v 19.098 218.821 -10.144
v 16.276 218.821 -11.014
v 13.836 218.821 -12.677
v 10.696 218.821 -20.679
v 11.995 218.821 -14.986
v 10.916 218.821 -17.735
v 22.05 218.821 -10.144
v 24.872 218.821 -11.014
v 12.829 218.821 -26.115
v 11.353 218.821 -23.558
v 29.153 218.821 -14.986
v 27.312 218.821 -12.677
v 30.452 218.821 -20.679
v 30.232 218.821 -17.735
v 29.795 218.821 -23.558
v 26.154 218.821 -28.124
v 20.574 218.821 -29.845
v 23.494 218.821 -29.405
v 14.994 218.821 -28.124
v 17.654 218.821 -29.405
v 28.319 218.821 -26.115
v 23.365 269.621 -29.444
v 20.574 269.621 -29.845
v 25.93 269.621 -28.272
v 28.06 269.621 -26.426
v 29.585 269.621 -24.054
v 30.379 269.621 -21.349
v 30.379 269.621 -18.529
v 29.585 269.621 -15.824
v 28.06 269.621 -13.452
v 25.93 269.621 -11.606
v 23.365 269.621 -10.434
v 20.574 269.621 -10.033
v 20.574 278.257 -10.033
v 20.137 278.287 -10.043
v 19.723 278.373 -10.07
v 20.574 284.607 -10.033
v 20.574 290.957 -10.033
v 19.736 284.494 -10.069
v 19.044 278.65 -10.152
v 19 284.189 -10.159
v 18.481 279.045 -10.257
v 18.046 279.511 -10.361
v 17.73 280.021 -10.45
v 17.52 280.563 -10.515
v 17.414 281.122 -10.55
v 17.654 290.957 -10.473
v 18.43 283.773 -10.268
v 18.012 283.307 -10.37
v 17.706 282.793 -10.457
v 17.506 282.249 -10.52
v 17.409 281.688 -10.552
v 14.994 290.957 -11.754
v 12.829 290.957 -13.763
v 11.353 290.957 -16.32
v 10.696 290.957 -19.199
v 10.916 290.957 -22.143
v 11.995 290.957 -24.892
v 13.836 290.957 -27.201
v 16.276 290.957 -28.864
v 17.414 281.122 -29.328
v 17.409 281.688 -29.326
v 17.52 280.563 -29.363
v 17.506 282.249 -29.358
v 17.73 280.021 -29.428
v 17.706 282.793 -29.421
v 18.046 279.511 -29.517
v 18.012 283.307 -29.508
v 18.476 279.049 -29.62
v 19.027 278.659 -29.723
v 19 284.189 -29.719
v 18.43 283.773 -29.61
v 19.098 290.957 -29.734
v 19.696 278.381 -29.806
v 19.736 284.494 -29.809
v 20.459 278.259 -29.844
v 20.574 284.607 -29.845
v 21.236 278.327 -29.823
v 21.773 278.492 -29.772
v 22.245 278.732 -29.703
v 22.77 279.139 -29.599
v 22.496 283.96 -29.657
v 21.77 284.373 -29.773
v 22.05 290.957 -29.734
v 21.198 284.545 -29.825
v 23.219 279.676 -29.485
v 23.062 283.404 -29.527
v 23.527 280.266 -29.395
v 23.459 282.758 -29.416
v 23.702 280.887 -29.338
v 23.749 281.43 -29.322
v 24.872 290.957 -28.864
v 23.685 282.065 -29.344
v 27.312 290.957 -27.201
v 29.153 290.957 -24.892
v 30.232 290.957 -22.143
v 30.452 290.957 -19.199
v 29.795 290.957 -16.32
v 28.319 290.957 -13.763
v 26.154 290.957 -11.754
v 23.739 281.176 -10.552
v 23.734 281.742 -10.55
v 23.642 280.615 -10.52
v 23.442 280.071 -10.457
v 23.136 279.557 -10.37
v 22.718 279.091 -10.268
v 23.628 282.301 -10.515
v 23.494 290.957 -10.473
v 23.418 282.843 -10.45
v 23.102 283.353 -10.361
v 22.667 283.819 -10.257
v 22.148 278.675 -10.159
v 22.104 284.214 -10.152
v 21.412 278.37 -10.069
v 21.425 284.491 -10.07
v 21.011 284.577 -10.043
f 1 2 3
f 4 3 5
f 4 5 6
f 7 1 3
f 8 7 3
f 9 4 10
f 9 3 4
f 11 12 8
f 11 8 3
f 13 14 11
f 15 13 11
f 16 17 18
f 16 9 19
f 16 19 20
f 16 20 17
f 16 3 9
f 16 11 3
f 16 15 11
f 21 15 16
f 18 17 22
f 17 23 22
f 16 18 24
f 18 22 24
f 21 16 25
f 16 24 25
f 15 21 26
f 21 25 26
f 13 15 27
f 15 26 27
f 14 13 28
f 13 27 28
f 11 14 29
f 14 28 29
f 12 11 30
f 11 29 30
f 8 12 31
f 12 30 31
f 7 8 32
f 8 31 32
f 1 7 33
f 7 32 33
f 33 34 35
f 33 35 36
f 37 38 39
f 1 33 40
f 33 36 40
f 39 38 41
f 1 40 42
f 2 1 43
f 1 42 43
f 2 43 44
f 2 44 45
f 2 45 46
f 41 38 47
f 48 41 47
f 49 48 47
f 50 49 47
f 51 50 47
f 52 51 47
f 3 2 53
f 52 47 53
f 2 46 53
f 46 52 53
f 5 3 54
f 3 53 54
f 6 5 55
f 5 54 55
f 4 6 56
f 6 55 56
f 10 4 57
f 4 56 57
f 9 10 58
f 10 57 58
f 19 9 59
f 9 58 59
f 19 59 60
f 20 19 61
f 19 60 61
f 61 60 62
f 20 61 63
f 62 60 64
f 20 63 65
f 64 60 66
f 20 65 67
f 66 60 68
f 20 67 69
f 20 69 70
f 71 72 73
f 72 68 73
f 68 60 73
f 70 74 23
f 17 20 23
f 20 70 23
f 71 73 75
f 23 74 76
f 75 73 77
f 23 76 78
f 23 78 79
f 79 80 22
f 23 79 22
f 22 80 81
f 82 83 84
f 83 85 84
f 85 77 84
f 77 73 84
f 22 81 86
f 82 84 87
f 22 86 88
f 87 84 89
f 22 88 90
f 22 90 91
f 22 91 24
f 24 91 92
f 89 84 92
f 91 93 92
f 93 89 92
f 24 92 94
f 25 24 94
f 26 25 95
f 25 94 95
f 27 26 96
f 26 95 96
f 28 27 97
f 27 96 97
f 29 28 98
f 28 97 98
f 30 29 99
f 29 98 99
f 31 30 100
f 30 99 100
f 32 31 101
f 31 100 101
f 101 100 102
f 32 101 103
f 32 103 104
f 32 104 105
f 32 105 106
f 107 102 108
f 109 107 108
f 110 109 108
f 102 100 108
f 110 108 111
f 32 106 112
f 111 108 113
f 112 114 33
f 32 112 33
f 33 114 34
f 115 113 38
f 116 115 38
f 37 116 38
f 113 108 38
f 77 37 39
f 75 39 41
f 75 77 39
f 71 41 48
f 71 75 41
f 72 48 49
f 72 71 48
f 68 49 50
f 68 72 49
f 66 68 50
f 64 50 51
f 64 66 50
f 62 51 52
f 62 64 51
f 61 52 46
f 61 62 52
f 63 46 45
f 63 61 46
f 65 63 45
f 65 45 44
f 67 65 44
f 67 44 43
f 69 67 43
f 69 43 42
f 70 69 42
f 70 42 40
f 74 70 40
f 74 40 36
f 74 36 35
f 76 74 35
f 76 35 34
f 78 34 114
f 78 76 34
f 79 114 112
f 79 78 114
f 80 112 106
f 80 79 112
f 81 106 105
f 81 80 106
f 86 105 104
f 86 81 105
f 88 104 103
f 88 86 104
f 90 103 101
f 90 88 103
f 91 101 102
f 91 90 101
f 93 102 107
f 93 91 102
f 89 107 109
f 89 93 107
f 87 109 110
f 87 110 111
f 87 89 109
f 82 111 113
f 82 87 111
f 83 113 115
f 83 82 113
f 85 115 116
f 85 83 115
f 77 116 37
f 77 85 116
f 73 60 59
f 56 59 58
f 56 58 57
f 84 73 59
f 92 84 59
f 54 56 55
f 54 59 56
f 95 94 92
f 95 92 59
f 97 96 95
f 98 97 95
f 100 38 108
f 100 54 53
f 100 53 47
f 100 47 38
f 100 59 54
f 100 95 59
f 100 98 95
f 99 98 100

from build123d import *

# Parameters (mm, degrees)
BOSS_EXTRUDE1_DEPTH      = 6.35
SKETCH6_R                = 19.431
BOSS_EXTRUDE4_DEPTH      = 0.762
SKETCH7_R                = 19.05
BOSS_EXTRUDE5_DEPTH      = 68.326
FILLET6_R                = 5.08
FILLET7_R                = 1.905
BOSS_EXTRUDE15_DEPTH     = 6.35
SKETCH24_R               = 4.064
BOSS_EXTRUDE16_DEPTH     = 10.16
SKETCH25_R               = 2.54
BOSS_EXTRUDE17_DEPTH     = 10.16
BOSS_EXTRUDE19_DEPTH     = 16.51
FILLET13_R               = 1.905
FILLET14_R               = 5.08
BOSS_EXTRUDE20_DEPTH     = 18.796
CHAMFER1_SIZE            = 2.54
FILLET15_R               = 2.54
CHAMFER2_SIZE            = 0.762
SKETCH27_R               = 3.175
CUT_EXTRUDE3_DEPTH       = 19.05
SKETCH28_R               = 19.05
BOSS_EXTRUDE22_DEPTH     = 1.27
SKETCH29_R               = 19.05
BOSS_EXTRUDE24_DEPTH     = 3.048
BOSS_EXTRUDE25_START     = 4.318
SKETCH8_R                = 4.953
BOSS_EXTRUDE25_DEPTH     = 1.27
FILLET16_R               = 0.2286
BOSS_EXTRUDE26_DEPTH     = 254.381
BOSS_EXTRUDE27_DEPTH     = 8.89
SKETCH33_R               = 9.906
BOSS_EXTRUDE28_DEPTH     = 21.336
BOSS_EXTRUDE30_DEPTH     = 2.159
BOSS_EXTRUDE31_DEPTH     = 2.159
BOSS_EXTRUDE33_DEPTH     = 12.7
BOSS_EXTRUDE33_2_DEPTH   = 12.7
FILLET17_R               = 0.2286
FILLET18_R               = 0.2286
SKETCH43_R               = 3.175
BOSS_EXTRUDE34_DEPTH     = 1.27
FILLET19_R               = 1.27
SKETCH44_R               = 3.175
BOSS_EXTRUDE35_DEPTH     = 1.27
FILLET20_R               = 1.27
CUT_EXTRUDE5_START       = -2.54
CUT_EXTRUDE5_DEPTH       = 2.54
CUT_EXTRUDE6_START       = -2.54
CUT_EXTRUDE6_DEPTH       = 2.54
SKETCH47_R               = 2.54
BOSS_EXTRUDE36_DEPTH     = 2.54
BOSS_EXTRUDE36_2_DEPTH   = 2.54
BOSS_EXTRUDE36_3_DEPTH   = 2.54
FILLET22_R               = 1.524
FILLET23_R               = 1.524
SKETCH48_R               = 3.81
BOSS_EXTRUDE37_DEPTH     = 1.524
FILLET24_R               = 1.524
FILLET25_R               = 1.524
SKETCH49_R               = 3.81
CUT_EXTRUDE7_DEPTH       = 2.54
SKETCH50_R               = 3.556
BOSS_EXTRUDE39_DEPTH     = 2.54
CUT_EXTRUDE11_DEPTH      = 305.554552522
CUT_EXTRUDE11_DEPTH_BACK = 305.554552522
SKETCH52_R               = 3.175
SKETCH55_W               = 170.584012947
SKETCH55_H               = 114.953192418
CUT_EXTRUDE13_DEPTH      = 346.202
SKETCH56_R               = 9.906
BOSS_EXTRUDE40_DEPTH     = 50.8


with BuildPart() as part:
    # Sketch1 → Boss-Extrude1 (new body)
    with BuildSketch(Plane(origin=(0, 0, 0), x_dir=(1, 0, 0), z_dir=(0, 1, 0))):
        with BuildLine():
            Line((0, 32.639), (7.239, 39.878))
            Line((7.239, 39.878), (55.118, 39.878))
            ThreePointArc((55.118, 39.878), (75.057, 19.939), (55.118, 0))
            Line((55.118, 0), (7.239, 0))
            Line((7.239, 0), (0, 7.239))
            Line((0, 7.239), (0, 32.639))
        make_face()
    extrude(amount=BOSS_EXTRUDE1_DEPTH)

    # Fillet6
    fillet6_edges = [part.edges().sort_by_distance(p)[0] for p in [
        (0, 3.175, -7.239),
        (0, 3.175, -32.639),
    ]]
    fillet(fillet6_edges, radius=FILLET6_R)

    # Fillet7
    fillet7_edges = [part.edges().sort_by_distance(p)[0] for p in [
        (7.239, 3.175, 0),
        (7.239, 3.175, -39.878),
    ]]
    fillet(fillet7_edges, radius=FILLET7_R)


with BuildPart() as body_2:
    # Sketch6 → Boss-Extrude4 (new body)
    with BuildSketch(Plane(origin=(0, 6.35, 0), x_dir=(1, 0, 0), z_dir=(0, 1, 0))):
        with Locations(Location((55.118, 19.939, 0), (0, 0, 90))):
            Circle(SKETCH6_R)
    extrude(amount=BOSS_EXTRUDE4_DEPTH)


with BuildPart() as body_3:
    # Sketch7 → Boss-Extrude5 (new body)
    with BuildSketch(Plane(origin=(0, 7.112, 0), x_dir=(1, 0, 0), z_dir=(0, 1, 0))):
        with Locations(Location((55.118, 19.939, 0), (0, 0, 270))):
            Circle(SKETCH7_R)
    extrude(amount=BOSS_EXTRUDE5_DEPTH)


with BuildPart() as body_4:
    # Sketch23 → Boss-Extrude15 (new body)
    with BuildSketch(Plane(origin=(12.522748088, 0, -46.735532116), x_dir=(0, -1, 0), z_dir=(0.25881904510252135, 0, -0.9659258262890681))):
        with BuildLine():
            Line((-2.032, -53.883866243), (5.588, -53.883866243))
            ThreePointArc((5.588, -53.883866243), (11.303, -48.168866243), (5.588, -42.453866243))
            Line((5.588, -42.453866243), (-2.032, -42.453866243))
            Line((-2.032, -42.453866243), (-2.032, -53.883866243))
        make_face()
    extrude(amount=BOSS_EXTRUDE15_DEPTH)

    # Sketch24 → Boss-Extrude16 (add)
    with BuildSketch(Plane(origin=(14.166249025, 0, -52.869161113), x_dir=(-0.9659258262890682, 0, -0.25881904510252135), z_dir=(0.2588190451025213, 0, -0.9659258262890681))):
        with Locations((-48.168866243, -5.588)):
            Circle(SKETCH24_R)
    extrude(amount=BOSS_EXTRUDE16_DEPTH)

    # Sketch25 → Boss-Extrude17 (add)
    with BuildSketch(Plane(origin=(16.795850523, 0, -62.682967508), x_dir=(-0.9659258262890681, 0, -0.25881904510252135), z_dir=(0.25881904510252135, 0, -0.9659258262890681))):
        with Locations((-48.168866243, -5.588)):
            Circle(SKETCH25_R)
    extrude(amount=BOSS_EXTRUDE17_DEPTH)


with BuildPart() as body_5:
    # Sketch1<3> → Boss-Extrude19 (new body)
    with BuildSketch(Plane(origin=(0, 0, 0), x_dir=(1, 0, 0), z_dir=(0, 1, 0))):
        with BuildLine():
            Line((0, 32.639), (7.239, 39.878))
            Line((7.239, 39.878), (55.118, 39.878))
            ThreePointArc((55.118, 39.878), (75.057, 19.939), (55.118, 0))
            Line((55.118, 0), (7.239, 0))
            Line((7.239, 0), (0, 7.239))
            Line((0, 7.239), (0, 32.639))
        make_face()
    extrude(amount=-BOSS_EXTRUDE19_DEPTH)

    # Fillet13
    fillet13_edges = [body_5.edges().sort_by_distance(p)[0] for p in [
        (7.239, -8.255, 0),
        (7.239, -8.255, -39.878),
    ]]
    fillet(fillet13_edges, radius=FILLET13_R)

    # Fillet14
    fillet14_edges = [body_5.edges().sort_by_distance(p)[0] for p in [
        (0, -8.255, -7.239),
        (0, -8.255, -32.639),
    ]]
    fillet(fillet14_edges, radius=FILLET14_R)

    # Sketch45 → Cut-Extrude5 (cut)
    with BuildSketch(Plane.XZ.offset(16.51).offset(CUT_EXTRUDE5_START)):
        with BuildLine():
            ThreePointArc((5.044290367, -35.978344089), (4.718699387, -36.549691761), (4.084467985, -36.723467985))
            Line((4.084467985, -36.723467985), (6.681038418, -39.320038418))
            ThreePointArc((6.681038418, -39.320038418), (7.299064898, -39.732990509), (8.028076836, -39.878))
            Line((8.028076836, -39.878), (11.393838428, -39.878))
            ThreePointArc((11.393838428, -39.878), (11.138454644, -39.419455597), (11.282110896, -38.914632134))
            ThreePointArc((11.282110896, -38.914632134), (10.476958507, -32.531164357), (5.044290367, -35.978344089))
        make_face()
        with BuildLine():
            ThreePointArc((11.282110896, -0.963367866), (11.138454644, -0.458544403), (11.393838428, 0))
            Line((11.393838428, 0), (8.028076836, 0))
            ThreePointArc((8.028076836, 0), (7.299064898, -0.145009491), (6.681038418, -0.557961582))
            Line((6.681038418, -0.557961582), (4.084467985, -3.154532015))
            ThreePointArc((4.084467985, -3.154532015), (4.718699387, -3.328308239), (5.044290367, -3.899655911))
            ThreePointArc((5.044290367, -3.899655911), (10.476958507, -7.346835643), (11.282110896, -0.963367866))
        make_face()
    extrude(amount=CUT_EXTRUDE5_DEPTH, mode=Mode.SUBTRACT)

    # Sketch45<3> → Cut-Extrude6 (cut)
    with BuildSketch(Plane.XZ.offset(16.51).offset(CUT_EXTRUDE6_START)):
        with BuildLine():
            Line((4.084467985, -36.723467985), (6.681038418, -39.320038418))
            ThreePointArc((6.681038418, -39.320038418), (7.299064898, -39.732990509), (8.028076836, -39.878))
            Line((8.028076836, -39.878), (11.393838428, -39.878))
            ThreePointArc((11.393838428, -39.878), (11.138454644, -39.419455597), (11.282110896, -38.914632134))
            ThreePointArc((11.282110896, -38.914632134), (10.476958507, -32.531164357), (5.044290367, -35.978344089))
            ThreePointArc((5.044290367, -35.978344089), (4.718699387, -36.549691761), (4.084467985, -36.723467985))
        make_face()
        with BuildLine():
            Line((11.393838428, 0), (8.028076836, 0))
            ThreePointArc((8.028076836, 0), (7.299064898, -0.145009491), (6.681038418, -0.557961582))
            Line((6.681038418, -0.557961582), (4.084467985, -3.154532015))
            ThreePointArc((4.084467985, -3.154532015), (4.718699387, -3.328308239), (5.044290367, -3.899655911))
            ThreePointArc((5.044290367, -3.899655911), (10.476958507, -7.346835643), (11.282110896, -0.963367866))
            ThreePointArc((11.282110896, -0.963367866), (11.138454644, -0.458544403), (11.393838428, 0))
        make_face()
        with BuildLine():
            ThreePointArc((73.662109712, -16.992248385), (67.437, -19.939), (73.662109712, -22.885751615))
            ThreePointArc((73.662109712, -22.885751615), (74.341584064, -23.041280193), (74.712069674, -23.631716426))
            ThreePointArc((74.712069674, -23.631716426), (75.057, -19.939), (74.712069674, -16.246283574))
            ThreePointArc((74.712069674, -16.246283574), (74.341584064, -16.836719807), (73.662109712, -16.992248385))
        make_face()
    extrude(amount=CUT_EXTRUDE6_DEPTH, mode=Mode.SUBTRACT)


with BuildPart() as body_6:
    # Sketch26 → Boss-Extrude20 (new body)
    with BuildSketch(Plane(origin=(0, -16.51, 0), x_dir=(-1, 0, 0), z_dir=(0, -1, 0))):
        Polygon((-20.574, 28.829), (-11.684, 28.829), (-11.684, 11.049), (-29.464, 11.049), (-29.464, 28.829), align=None)
    extrude(amount=BOSS_EXTRUDE20_DEPTH)

    # Chamfer1
    chamfer1_edges = [body_6.edges().sort_by_distance(p)[0] for p in [
        (11.684, -25.908, -11.049),
        (29.464, -25.908, -11.049),
        (29.464, -25.908, -28.829),
        (11.684, -25.908, -28.829),
    ]]
    chamfer(chamfer1_edges, length=CHAMFER1_SIZE)

    # Fillet15
    fillet15_edges = [body_6.edges().sort_by_distance(p)[0] for p in [
        (29.464, -25.908, -13.589),
        (29.464, -25.908, -26.289),
        (14.224, -25.908, -28.829),
        (26.924, -25.908, -28.829),
        (14.224, -25.908, -11.049),
        (26.924, -25.908, -11.049),
        (11.684, -25.908, -26.289),
        (11.684, -25.908, -13.589),
    ]]
    fillet(fillet15_edges, radius=FILLET15_R)

    # Chamfer2
    chamfer2_edges = [body_6.edges().sort_by_distance(p)[0] for p in [
        (11.684, -35.306, -19.939),
        (12.954, -35.306, -12.319),
        (20.574, -35.306, -28.829),
        (28.194, -35.306, -27.559),
        (29.464, -35.306, -19.939),
        (28.194, -35.306, -12.319),
        (20.574, -35.306, -11.049),
        (12.954, -35.306, -27.559),
        (14.30408653, -35.306, -28.635654013),
        (11.877345987, -35.306, -26.20891347),
        (26.84391347, -35.306, -28.635654013),
        (29.270654013, -35.306, -26.20891347),
        (29.270654013, -35.306, -13.66908653),
        (26.84391347, -35.306, -11.242345987),
        (14.30408653, -35.306, -11.242345987),
        (11.877345987, -35.306, -13.66908653),
    ]]
    chamfer(chamfer2_edges, length=CHAMFER2_SIZE)

    # Sketch27 → Cut-Extrude3 (cut)
    with BuildSketch(Plane.XY.offset(-11.049)):
        with Locations((20.574, -26.67)):
            Circle(SKETCH27_R)
    extrude(amount=-CUT_EXTRUDE3_DEPTH, mode=Mode.SUBTRACT)


with BuildPart() as body_7:
    # Sketch28 → Boss-Extrude22 (new body)
    with BuildSketch(Plane(origin=(0, 75.438, 0), x_dir=(1, 0, 0), z_dir=(0, 1, 0))):
        with Locations(Location((55.118, 19.939, 0), (0, 0, 270))):
            Circle(SKETCH28_R)
    extrude(amount=BOSS_EXTRUDE22_DEPTH)


with BuildPart() as body_8:
    # Sketch29 → Boss-Extrude24 (new body)
    with BuildSketch(Plane(origin=(0, 76.708, 0), x_dir=(1, 0, 0), z_dir=(0, 1, 0))):
        with Locations(Location((55.118, 19.939, 0), (0, 0, 270))):
            Circle(SKETCH29_R)
    extrude(amount=BOSS_EXTRUDE24_DEPTH)

    # Sketch8 → Boss-Extrude25 (add)
    with BuildSketch(Plane(origin=(0, 75.438, 0), x_dir=(1, 0, 0), z_dir=(0, 1, 0)).offset(BOSS_EXTRUDE25_START)):
        with Locations(Location((55.118, 19.939, 0), (0, 0, 270))):
            Circle(SKETCH8_R)
    extrude(amount=BOSS_EXTRUDE25_DEPTH)

    # Fillet16
    fillet16_edges = [body_8.edges().sort_by_distance(p)[0] for p in [
        (55.118, 81.026, -24.892),
    ]]
    fillet(fillet16_edges, radius=FILLET16_R)


with BuildPart() as body_9:
    # Sketch15 → Boss-Extrude26 (new body)
    with BuildSketch(Plane(origin=(0, 6.35, 0), x_dir=(1, 0, 0), z_dir=(0, 1, 0))):
        with BuildLine():
            Line((0, 19.939), (0, 10.286870396))
            Line((0, 10.286870396), (16.411980417, 5.54225678))
            ThreePointArc((16.411980417, 5.54225678), (35.560281138, 19.939054609), (16.411875495, 34.335712887))
            Line((16.411875495, 34.335712887), (0, 29.591))
            Line((0, 29.591), (0, 19.939))
        make_face()
    extrude(amount=BOSS_EXTRUDE26_DEPTH)

    # Sketch48 → Boss-Extrude37 (add)
    with BuildSketch(Plane.ZY):
        with Locations(Location((-19.939, 12.7, 0), (0, 0, 180))):
            Circle(SKETCH48_R)
    extrude(amount=BOSS_EXTRUDE37_DEPTH)

    # Fillet24
    fillet24_edges = [body_9.edges().sort_by_distance(p)[0] for p in [
        (-1.524, 12.7, -16.129),
    ]]
    fillet(fillet24_edges, radius=FILLET24_R - 0.0001)  # a hair under: the kernel refuses the full size

    # Sketch49 → Cut-Extrude7 (cut)
    with BuildSketch(Plane.ZY):
        with Locations((-19.938935198, 255.778)):
            Circle(SKETCH49_R)
    extrude(amount=-CUT_EXTRUDE7_DEPTH, mode=Mode.SUBTRACT)

    # Sketch50 → Boss-Extrude39 (add)
    with BuildSketch(Plane.ZY.offset(-2.54)):
        with Locations((-19.938935198, 255.778)):
            Circle(SKETCH50_R)
    extrude(amount=BOSS_EXTRUDE39_DEPTH)


with BuildPart() as body_10:
    # Sketch32 → Boss-Extrude27 (new body)
    with BuildSketch(Plane(origin=(0, 260.731, 0), x_dir=(1, 0, 0), z_dir=(0, 1, 0))):
        with BuildLine():
            Line((0, 10.286870396), (0, 29.591))
            Line((0, 29.591), (16.411875495, 34.335712887))
            ThreePointArc((16.411875495, 34.335712887), (35.560281138, 19.939054609), (16.411980417, 5.54225678))
            Line((16.411980417, 5.54225678), (0, 10.286870396))
        make_face()
    extrude(amount=BOSS_EXTRUDE27_DEPTH)

    # Sketch33 → Boss-Extrude28 (add)
    with BuildSketch(Plane(origin=(0, 269.621, 0), x_dir=(1, 0, 0), z_dir=(0, 1, 0))):
        with Locations(Location((20.574, 19.939, 0), (0, 0, 270))):
            Circle(SKETCH33_R)
    extrude(amount=BOSS_EXTRUDE28_DEPTH)

    # Sketch52 → Cut-Extrude11 (cut, two sides: drawn at the far end of the back side and taken through both)
    with BuildSketch(Plane.XY.offset(-11.049).offset(-CUT_EXTRUDE11_DEPTH_BACK)):
        with Locations(Location((20.574, 281.432, 0), (0, 0, 89.99999999))):
            Circle(SKETCH52_R)
    extrude(amount=CUT_EXTRUDE11_DEPTH + CUT_EXTRUDE11_DEPTH_BACK, mode=Mode.SUBTRACT)


with BuildPart() as body_11:
    # Sketch41 → Boss-Extrude30 (new body)
    with BuildSketch(Plane(origin=(0, 6.35, 0), x_dir=(1, 0, 0), z_dir=(0, 1, 0))):
        with BuildLine():
            Line((0, 29.591), (16.411875495, 34.335712887))
            ThreePointArc((16.411875495, 34.335712887), (22.021175201, 34.855243035), (27.425990452, 33.267122493))
            Line((27.425990452, 33.267122493), (29.11221422, 34.953346261))
            ThreePointArc((29.11221422, 34.953346261), (22.604273469, 37.091541659), (15.776987058, 36.531780434))
            Line((15.776987058, 36.531780434), (0.2736806, 32.049737053))
            Line((0.2736806, 32.049737053), (0, 30.534795103))
            Line((0, 30.534795103), (0, 29.591))
        make_face()
    extrude(amount=BOSS_EXTRUDE30_DEPTH)


with BuildPart() as body_12:
    # Sketch41<11> → Boss-Extrude31 (new body)
    with BuildSketch(Plane(origin=(0, 6.35, 0), x_dir=(1, 0, 0), z_dir=(0, 1, 0))):
        with BuildLine():
            Line((16.411875495, 5.542157508), (0, 10.286870396))
            Line((0, 10.286870396), (0, 9.343204897))
            Line((0, 9.343204897), (0, 9.343075292))
            Line((0, 9.343075292), (0.2736806, 7.828133343))
            Line((0.2736806, 7.828133343), (15.776987058, 3.346089961))
            ThreePointArc((15.776987058, 3.346089961), (22.604273469, 2.786328737), (29.11221422, 4.924524135))
            Line((29.11221422, 4.924524135), (27.425990452, 6.610747903))
            ThreePointArc((27.425990452, 6.610747903), (22.021175201, 5.02262736), (16.411875495, 5.542157508))
        make_face()
    extrude(amount=BOSS_EXTRUDE31_DEPTH)


with BuildPart() as body_13:
    # Sketch41<12> → Boss-Extrude33 (new body)
    with BuildSketch(Plane(origin=(0, 6.35, 0), x_dir=(1, 0, 0), z_dir=(0, 1, 0))):
        with BuildLine():
            Line((29.11221422, 34.953346261), (27.425990452, 33.267122493))
            ThreePointArc((27.425990452, 33.267122493), (31.070982239, 30.634886416), (33.77116823, 27.039941701))
            Line((33.77116823, 27.039941701), (37.542875801, 30.811649272))
            Line((37.542875801, 30.811649272), (31.256696516, 37.097828557))
            Line((31.256696516, 37.097828557), (29.11221422, 34.953346261))
        make_face()
    extrude(amount=BOSS_EXTRUDE33_DEPTH)

    # Fillet17
    fillet17_edges = [body_13.edges().sort_by_distance(p)[0] for p in [
        (35.657022016, 19.05, -28.925795487),
        (34.399786159, 19.05, -33.954738915),
        (29.341343484, 19.05, -35.182475525),
        (31.256696516, 12.7, -37.097828557),
        (37.542875801, 12.7, -30.811649272),
    ]]
    fillet(fillet17_edges, radius=FILLET17_R)


with BuildPart() as body_14:
    # Sketch41<12> → Boss-Extrude33 2 (new body)
    with BuildSketch(Plane(origin=(0, 6.35, 0), x_dir=(1, 0, 0), z_dir=(0, 1, 0))):
        with BuildLine():
            Line((31.256696516, 2.780041839), (37.542875801, 9.066221123))
            Line((37.542875801, 9.066221123), (33.77116823, 12.837928694))
            ThreePointArc((33.77116823, 12.837928694), (31.070982239, 9.24298398), (27.425990452, 6.610747903))
            Line((27.425990452, 6.610747903), (29.11221422, 4.924524135))
            Line((29.11221422, 4.924524135), (31.256696516, 2.780041839))
        make_face()
    extrude(amount=BOSS_EXTRUDE33_2_DEPTH)

    # Fillet18
    fillet18_edges = [body_14.edges().sort_by_distance(p)[0] for p in [
        (34.399786159, 19.05, -5.923131481),
        (35.657022016, 19.05, -10.952074909),
        (29.341343484, 19.05, -4.695394871),
        (37.542875801, 12.7, -9.066221123),
        (31.256696516, 12.7, -2.780041839),
    ]]
    fillet(fillet18_edges, radius=FILLET18_R)


with BuildPart() as body_15:
    # Sketch43 → Boss-Extrude34 (new body)
    with BuildSketch(Plane(origin=(34.177262537, 0, -34.177262537), x_dir=(-0.7071067811865481, 0, -0.7071067811865469), z_dir=(0.7071067811865469, 0, -0.7071067811865481))):
        with Locations(Location((-0.314695924, 13.7414, 0), (0, 0, 180))):
            Circle(SKETCH43_R)
    extrude(amount=BOSS_EXTRUDE34_DEPTH)

    # Fillet19
    fillet19_edges = [body_15.edges().sort_by_distance(p)[0] for p in [
        (33.052747741, 13.7414, -37.097828557),
    ]]
    fillet(fillet19_edges, radius=FILLET19_R - 0.0001)  # a hair under: the kernel refuses the full size


with BuildPart() as body_16:
    # Sketch44 → Boss-Extrude35 (new body)
    with BuildSketch(Plane(origin=(14.238327339, 0, 14.238327339), x_dir=(0.7071067811865481, 0, -0.7071067811865469), z_dir=(0.7071067811865469, 0, 0.7071067811865481))):
        with Locations(Location((28.5126085, 13.7414, 0), (0, 0, 180))):
            Circle(SKETCH44_R)
    extrude(amount=BOSS_EXTRUDE35_DEPTH)

    # Fillet20
    fillet20_edges = [body_16.edges().sort_by_distance(p)[0] for p in [
        (37.542875801, 13.7414, -7.270169899),
    ]]
    fillet(fillet20_edges, radius=FILLET20_R - 0.0001)  # a hair under: the kernel refuses the full size


with BuildPart() as body_17:
    # Sketch47 → Boss-Extrude36 (new body)
    with BuildSketch(Plane(origin=(0, -13.97, 0), x_dir=(-1, 0, 0), z_dir=(0, -1, 0))):
        with Locations(Location((-8.854290367, 35.978344089, 0), (0, 0, 90))):
            Circle(SKETCH47_R)
    extrude(amount=BOSS_EXTRUDE36_DEPTH)

    # Fillet22
    fillet22_edges = [body_17.edges().sort_by_distance(p)[0] for p in [
        (8.854290367, -16.51, -33.438344089),
    ]]
    fillet(fillet22_edges, radius=FILLET22_R)


with BuildPart() as body_18:
    # Sketch47 → Boss-Extrude36 2 (new body)
    with BuildSketch(Plane(origin=(0, -13.97, 0), x_dir=(-1, 0, 0), z_dir=(0, -1, 0))):
        with Locations(Location((-8.854290367, 3.899655911, 0), (0, 0, 90))):
            Circle(SKETCH47_R)
    extrude(amount=BOSS_EXTRUDE36_2_DEPTH)

    # Fillet23
    fillet23_edges = [body_18.edges().sort_by_distance(p)[0] for p in [
        (8.854290367, -16.51, -1.359655911),
    ]]
    fillet(fillet23_edges, radius=FILLET23_R)


with BuildPart() as body_19:
    # Sketch47 → Boss-Extrude36 3 (new body)
    with BuildSketch(Plane(origin=(0, -13.97, 0), x_dir=(-1, 0, 0), z_dir=(0, -1, 0))):
        with Locations(Location((-71.247, 19.939, 0), (0, 0, 90))):
            Circle(SKETCH47_R)
    extrude(amount=BOSS_EXTRUDE36_3_DEPTH)

    # Fillet25
    fillet25_edges = [body_19.edges().sort_by_distance(p)[0] for p in [
        (71.247, -16.51, -17.399),
    ]]
    fillet(fillet25_edges, radius=FILLET25_R)


with BuildPart() as cut_extrude13_tool:
    # Sketch55 → Cut-Extrude13 (new body)
    with BuildSketch(Plane(origin=(0, 269.621, 0), x_dir=(1, 0, 0), z_dir=(0, 1, 0))):
        with Locations((34.605125539, 14.00827457)):
            Rectangle(SKETCH55_W, SKETCH55_H)
    extrude(amount=-CUT_EXTRUDE13_DEPTH)


with BuildPart() as part_1:
    add(part.part)

    # Cut-Extrude13: cut by cut_extrude13_tool
    add(cut_extrude13_tool.part, mode=Mode.SUBTRACT)


with BuildPart() as body_2_1:
    add(body_2.part)

    # Cut-Extrude13: cut by cut_extrude13_tool
    add(cut_extrude13_tool.part, mode=Mode.SUBTRACT)


with BuildPart() as body_3_1:
    add(body_3.part)

    # Cut-Extrude13: cut by cut_extrude13_tool
    add(cut_extrude13_tool.part, mode=Mode.SUBTRACT)


with BuildPart() as body_4_1:
    add(body_4.part)

    # Cut-Extrude13: cut by cut_extrude13_tool
    add(cut_extrude13_tool.part, mode=Mode.SUBTRACT)


with BuildPart() as body_5_1:
    add(body_5.part)

    # Cut-Extrude13: cut by cut_extrude13_tool
    add(cut_extrude13_tool.part, mode=Mode.SUBTRACT)


with BuildPart() as body_6_1:
    add(body_6.part)

    # Cut-Extrude13: cut by cut_extrude13_tool
    add(cut_extrude13_tool.part, mode=Mode.SUBTRACT)


with BuildPart() as body_7_1:
    add(body_7.part)

    # Cut-Extrude13: cut by cut_extrude13_tool
    add(cut_extrude13_tool.part, mode=Mode.SUBTRACT)


with BuildPart() as body_8_1:
    add(body_8.part)

    # Cut-Extrude13: cut by cut_extrude13_tool
    add(cut_extrude13_tool.part, mode=Mode.SUBTRACT)


with BuildPart() as body_9_1:
    add(body_9.part)

    # Cut-Extrude13: cut by cut_extrude13_tool
    add(cut_extrude13_tool.part, mode=Mode.SUBTRACT)


with BuildPart() as body_10_1:
    add(body_10.part)

    # Cut-Extrude13: cut by cut_extrude13_tool
    add(cut_extrude13_tool.part, mode=Mode.SUBTRACT)

    # Sketch56 → Boss-Extrude40 (add)
    with BuildSketch(Plane.XZ.offset(-269.621)):
        with Locations(Location((20.574, -19.939, 0), (0, 0, 270))):
            Circle(SKETCH56_R)
    extrude(amount=BOSS_EXTRUDE40_DEPTH)


with BuildPart() as body_11_1:
    add(body_11.part)

    # Cut-Extrude13: cut by cut_extrude13_tool
    add(cut_extrude13_tool.part, mode=Mode.SUBTRACT)


with BuildPart() as body_12_1:
    add(body_12.part)

    # Cut-Extrude13: cut by cut_extrude13_tool
    add(cut_extrude13_tool.part, mode=Mode.SUBTRACT)


with BuildPart() as body_13_1:
    add(body_13.part)

    # Cut-Extrude13: cut by cut_extrude13_tool
    add(cut_extrude13_tool.part, mode=Mode.SUBTRACT)


with BuildPart() as body_14_1:
    add(body_14.part)

    # Cut-Extrude13: cut by cut_extrude13_tool
    add(cut_extrude13_tool.part, mode=Mode.SUBTRACT)


with BuildPart() as body_15_1:
    add(body_15.part)

    # Cut-Extrude13: cut by cut_extrude13_tool
    add(cut_extrude13_tool.part, mode=Mode.SUBTRACT)


with BuildPart() as body_16_1:
    add(body_16.part)

    # Cut-Extrude13: cut by cut_extrude13_tool
    add(cut_extrude13_tool.part, mode=Mode.SUBTRACT)


with BuildPart() as body_17_1:
    add(body_17.part)

    # Cut-Extrude13: cut by cut_extrude13_tool
    add(cut_extrude13_tool.part, mode=Mode.SUBTRACT)


with BuildPart() as body_18_1:
    add(body_18.part)

    # Cut-Extrude13: cut by cut_extrude13_tool
    add(cut_extrude13_tool.part, mode=Mode.SUBTRACT)


with BuildPart() as body_19_1:
    add(body_19.part)

    # Cut-Extrude13: cut by cut_extrude13_tool
    add(cut_extrude13_tool.part, mode=Mode.SUBTRACT)


solid = body_10_1.part
